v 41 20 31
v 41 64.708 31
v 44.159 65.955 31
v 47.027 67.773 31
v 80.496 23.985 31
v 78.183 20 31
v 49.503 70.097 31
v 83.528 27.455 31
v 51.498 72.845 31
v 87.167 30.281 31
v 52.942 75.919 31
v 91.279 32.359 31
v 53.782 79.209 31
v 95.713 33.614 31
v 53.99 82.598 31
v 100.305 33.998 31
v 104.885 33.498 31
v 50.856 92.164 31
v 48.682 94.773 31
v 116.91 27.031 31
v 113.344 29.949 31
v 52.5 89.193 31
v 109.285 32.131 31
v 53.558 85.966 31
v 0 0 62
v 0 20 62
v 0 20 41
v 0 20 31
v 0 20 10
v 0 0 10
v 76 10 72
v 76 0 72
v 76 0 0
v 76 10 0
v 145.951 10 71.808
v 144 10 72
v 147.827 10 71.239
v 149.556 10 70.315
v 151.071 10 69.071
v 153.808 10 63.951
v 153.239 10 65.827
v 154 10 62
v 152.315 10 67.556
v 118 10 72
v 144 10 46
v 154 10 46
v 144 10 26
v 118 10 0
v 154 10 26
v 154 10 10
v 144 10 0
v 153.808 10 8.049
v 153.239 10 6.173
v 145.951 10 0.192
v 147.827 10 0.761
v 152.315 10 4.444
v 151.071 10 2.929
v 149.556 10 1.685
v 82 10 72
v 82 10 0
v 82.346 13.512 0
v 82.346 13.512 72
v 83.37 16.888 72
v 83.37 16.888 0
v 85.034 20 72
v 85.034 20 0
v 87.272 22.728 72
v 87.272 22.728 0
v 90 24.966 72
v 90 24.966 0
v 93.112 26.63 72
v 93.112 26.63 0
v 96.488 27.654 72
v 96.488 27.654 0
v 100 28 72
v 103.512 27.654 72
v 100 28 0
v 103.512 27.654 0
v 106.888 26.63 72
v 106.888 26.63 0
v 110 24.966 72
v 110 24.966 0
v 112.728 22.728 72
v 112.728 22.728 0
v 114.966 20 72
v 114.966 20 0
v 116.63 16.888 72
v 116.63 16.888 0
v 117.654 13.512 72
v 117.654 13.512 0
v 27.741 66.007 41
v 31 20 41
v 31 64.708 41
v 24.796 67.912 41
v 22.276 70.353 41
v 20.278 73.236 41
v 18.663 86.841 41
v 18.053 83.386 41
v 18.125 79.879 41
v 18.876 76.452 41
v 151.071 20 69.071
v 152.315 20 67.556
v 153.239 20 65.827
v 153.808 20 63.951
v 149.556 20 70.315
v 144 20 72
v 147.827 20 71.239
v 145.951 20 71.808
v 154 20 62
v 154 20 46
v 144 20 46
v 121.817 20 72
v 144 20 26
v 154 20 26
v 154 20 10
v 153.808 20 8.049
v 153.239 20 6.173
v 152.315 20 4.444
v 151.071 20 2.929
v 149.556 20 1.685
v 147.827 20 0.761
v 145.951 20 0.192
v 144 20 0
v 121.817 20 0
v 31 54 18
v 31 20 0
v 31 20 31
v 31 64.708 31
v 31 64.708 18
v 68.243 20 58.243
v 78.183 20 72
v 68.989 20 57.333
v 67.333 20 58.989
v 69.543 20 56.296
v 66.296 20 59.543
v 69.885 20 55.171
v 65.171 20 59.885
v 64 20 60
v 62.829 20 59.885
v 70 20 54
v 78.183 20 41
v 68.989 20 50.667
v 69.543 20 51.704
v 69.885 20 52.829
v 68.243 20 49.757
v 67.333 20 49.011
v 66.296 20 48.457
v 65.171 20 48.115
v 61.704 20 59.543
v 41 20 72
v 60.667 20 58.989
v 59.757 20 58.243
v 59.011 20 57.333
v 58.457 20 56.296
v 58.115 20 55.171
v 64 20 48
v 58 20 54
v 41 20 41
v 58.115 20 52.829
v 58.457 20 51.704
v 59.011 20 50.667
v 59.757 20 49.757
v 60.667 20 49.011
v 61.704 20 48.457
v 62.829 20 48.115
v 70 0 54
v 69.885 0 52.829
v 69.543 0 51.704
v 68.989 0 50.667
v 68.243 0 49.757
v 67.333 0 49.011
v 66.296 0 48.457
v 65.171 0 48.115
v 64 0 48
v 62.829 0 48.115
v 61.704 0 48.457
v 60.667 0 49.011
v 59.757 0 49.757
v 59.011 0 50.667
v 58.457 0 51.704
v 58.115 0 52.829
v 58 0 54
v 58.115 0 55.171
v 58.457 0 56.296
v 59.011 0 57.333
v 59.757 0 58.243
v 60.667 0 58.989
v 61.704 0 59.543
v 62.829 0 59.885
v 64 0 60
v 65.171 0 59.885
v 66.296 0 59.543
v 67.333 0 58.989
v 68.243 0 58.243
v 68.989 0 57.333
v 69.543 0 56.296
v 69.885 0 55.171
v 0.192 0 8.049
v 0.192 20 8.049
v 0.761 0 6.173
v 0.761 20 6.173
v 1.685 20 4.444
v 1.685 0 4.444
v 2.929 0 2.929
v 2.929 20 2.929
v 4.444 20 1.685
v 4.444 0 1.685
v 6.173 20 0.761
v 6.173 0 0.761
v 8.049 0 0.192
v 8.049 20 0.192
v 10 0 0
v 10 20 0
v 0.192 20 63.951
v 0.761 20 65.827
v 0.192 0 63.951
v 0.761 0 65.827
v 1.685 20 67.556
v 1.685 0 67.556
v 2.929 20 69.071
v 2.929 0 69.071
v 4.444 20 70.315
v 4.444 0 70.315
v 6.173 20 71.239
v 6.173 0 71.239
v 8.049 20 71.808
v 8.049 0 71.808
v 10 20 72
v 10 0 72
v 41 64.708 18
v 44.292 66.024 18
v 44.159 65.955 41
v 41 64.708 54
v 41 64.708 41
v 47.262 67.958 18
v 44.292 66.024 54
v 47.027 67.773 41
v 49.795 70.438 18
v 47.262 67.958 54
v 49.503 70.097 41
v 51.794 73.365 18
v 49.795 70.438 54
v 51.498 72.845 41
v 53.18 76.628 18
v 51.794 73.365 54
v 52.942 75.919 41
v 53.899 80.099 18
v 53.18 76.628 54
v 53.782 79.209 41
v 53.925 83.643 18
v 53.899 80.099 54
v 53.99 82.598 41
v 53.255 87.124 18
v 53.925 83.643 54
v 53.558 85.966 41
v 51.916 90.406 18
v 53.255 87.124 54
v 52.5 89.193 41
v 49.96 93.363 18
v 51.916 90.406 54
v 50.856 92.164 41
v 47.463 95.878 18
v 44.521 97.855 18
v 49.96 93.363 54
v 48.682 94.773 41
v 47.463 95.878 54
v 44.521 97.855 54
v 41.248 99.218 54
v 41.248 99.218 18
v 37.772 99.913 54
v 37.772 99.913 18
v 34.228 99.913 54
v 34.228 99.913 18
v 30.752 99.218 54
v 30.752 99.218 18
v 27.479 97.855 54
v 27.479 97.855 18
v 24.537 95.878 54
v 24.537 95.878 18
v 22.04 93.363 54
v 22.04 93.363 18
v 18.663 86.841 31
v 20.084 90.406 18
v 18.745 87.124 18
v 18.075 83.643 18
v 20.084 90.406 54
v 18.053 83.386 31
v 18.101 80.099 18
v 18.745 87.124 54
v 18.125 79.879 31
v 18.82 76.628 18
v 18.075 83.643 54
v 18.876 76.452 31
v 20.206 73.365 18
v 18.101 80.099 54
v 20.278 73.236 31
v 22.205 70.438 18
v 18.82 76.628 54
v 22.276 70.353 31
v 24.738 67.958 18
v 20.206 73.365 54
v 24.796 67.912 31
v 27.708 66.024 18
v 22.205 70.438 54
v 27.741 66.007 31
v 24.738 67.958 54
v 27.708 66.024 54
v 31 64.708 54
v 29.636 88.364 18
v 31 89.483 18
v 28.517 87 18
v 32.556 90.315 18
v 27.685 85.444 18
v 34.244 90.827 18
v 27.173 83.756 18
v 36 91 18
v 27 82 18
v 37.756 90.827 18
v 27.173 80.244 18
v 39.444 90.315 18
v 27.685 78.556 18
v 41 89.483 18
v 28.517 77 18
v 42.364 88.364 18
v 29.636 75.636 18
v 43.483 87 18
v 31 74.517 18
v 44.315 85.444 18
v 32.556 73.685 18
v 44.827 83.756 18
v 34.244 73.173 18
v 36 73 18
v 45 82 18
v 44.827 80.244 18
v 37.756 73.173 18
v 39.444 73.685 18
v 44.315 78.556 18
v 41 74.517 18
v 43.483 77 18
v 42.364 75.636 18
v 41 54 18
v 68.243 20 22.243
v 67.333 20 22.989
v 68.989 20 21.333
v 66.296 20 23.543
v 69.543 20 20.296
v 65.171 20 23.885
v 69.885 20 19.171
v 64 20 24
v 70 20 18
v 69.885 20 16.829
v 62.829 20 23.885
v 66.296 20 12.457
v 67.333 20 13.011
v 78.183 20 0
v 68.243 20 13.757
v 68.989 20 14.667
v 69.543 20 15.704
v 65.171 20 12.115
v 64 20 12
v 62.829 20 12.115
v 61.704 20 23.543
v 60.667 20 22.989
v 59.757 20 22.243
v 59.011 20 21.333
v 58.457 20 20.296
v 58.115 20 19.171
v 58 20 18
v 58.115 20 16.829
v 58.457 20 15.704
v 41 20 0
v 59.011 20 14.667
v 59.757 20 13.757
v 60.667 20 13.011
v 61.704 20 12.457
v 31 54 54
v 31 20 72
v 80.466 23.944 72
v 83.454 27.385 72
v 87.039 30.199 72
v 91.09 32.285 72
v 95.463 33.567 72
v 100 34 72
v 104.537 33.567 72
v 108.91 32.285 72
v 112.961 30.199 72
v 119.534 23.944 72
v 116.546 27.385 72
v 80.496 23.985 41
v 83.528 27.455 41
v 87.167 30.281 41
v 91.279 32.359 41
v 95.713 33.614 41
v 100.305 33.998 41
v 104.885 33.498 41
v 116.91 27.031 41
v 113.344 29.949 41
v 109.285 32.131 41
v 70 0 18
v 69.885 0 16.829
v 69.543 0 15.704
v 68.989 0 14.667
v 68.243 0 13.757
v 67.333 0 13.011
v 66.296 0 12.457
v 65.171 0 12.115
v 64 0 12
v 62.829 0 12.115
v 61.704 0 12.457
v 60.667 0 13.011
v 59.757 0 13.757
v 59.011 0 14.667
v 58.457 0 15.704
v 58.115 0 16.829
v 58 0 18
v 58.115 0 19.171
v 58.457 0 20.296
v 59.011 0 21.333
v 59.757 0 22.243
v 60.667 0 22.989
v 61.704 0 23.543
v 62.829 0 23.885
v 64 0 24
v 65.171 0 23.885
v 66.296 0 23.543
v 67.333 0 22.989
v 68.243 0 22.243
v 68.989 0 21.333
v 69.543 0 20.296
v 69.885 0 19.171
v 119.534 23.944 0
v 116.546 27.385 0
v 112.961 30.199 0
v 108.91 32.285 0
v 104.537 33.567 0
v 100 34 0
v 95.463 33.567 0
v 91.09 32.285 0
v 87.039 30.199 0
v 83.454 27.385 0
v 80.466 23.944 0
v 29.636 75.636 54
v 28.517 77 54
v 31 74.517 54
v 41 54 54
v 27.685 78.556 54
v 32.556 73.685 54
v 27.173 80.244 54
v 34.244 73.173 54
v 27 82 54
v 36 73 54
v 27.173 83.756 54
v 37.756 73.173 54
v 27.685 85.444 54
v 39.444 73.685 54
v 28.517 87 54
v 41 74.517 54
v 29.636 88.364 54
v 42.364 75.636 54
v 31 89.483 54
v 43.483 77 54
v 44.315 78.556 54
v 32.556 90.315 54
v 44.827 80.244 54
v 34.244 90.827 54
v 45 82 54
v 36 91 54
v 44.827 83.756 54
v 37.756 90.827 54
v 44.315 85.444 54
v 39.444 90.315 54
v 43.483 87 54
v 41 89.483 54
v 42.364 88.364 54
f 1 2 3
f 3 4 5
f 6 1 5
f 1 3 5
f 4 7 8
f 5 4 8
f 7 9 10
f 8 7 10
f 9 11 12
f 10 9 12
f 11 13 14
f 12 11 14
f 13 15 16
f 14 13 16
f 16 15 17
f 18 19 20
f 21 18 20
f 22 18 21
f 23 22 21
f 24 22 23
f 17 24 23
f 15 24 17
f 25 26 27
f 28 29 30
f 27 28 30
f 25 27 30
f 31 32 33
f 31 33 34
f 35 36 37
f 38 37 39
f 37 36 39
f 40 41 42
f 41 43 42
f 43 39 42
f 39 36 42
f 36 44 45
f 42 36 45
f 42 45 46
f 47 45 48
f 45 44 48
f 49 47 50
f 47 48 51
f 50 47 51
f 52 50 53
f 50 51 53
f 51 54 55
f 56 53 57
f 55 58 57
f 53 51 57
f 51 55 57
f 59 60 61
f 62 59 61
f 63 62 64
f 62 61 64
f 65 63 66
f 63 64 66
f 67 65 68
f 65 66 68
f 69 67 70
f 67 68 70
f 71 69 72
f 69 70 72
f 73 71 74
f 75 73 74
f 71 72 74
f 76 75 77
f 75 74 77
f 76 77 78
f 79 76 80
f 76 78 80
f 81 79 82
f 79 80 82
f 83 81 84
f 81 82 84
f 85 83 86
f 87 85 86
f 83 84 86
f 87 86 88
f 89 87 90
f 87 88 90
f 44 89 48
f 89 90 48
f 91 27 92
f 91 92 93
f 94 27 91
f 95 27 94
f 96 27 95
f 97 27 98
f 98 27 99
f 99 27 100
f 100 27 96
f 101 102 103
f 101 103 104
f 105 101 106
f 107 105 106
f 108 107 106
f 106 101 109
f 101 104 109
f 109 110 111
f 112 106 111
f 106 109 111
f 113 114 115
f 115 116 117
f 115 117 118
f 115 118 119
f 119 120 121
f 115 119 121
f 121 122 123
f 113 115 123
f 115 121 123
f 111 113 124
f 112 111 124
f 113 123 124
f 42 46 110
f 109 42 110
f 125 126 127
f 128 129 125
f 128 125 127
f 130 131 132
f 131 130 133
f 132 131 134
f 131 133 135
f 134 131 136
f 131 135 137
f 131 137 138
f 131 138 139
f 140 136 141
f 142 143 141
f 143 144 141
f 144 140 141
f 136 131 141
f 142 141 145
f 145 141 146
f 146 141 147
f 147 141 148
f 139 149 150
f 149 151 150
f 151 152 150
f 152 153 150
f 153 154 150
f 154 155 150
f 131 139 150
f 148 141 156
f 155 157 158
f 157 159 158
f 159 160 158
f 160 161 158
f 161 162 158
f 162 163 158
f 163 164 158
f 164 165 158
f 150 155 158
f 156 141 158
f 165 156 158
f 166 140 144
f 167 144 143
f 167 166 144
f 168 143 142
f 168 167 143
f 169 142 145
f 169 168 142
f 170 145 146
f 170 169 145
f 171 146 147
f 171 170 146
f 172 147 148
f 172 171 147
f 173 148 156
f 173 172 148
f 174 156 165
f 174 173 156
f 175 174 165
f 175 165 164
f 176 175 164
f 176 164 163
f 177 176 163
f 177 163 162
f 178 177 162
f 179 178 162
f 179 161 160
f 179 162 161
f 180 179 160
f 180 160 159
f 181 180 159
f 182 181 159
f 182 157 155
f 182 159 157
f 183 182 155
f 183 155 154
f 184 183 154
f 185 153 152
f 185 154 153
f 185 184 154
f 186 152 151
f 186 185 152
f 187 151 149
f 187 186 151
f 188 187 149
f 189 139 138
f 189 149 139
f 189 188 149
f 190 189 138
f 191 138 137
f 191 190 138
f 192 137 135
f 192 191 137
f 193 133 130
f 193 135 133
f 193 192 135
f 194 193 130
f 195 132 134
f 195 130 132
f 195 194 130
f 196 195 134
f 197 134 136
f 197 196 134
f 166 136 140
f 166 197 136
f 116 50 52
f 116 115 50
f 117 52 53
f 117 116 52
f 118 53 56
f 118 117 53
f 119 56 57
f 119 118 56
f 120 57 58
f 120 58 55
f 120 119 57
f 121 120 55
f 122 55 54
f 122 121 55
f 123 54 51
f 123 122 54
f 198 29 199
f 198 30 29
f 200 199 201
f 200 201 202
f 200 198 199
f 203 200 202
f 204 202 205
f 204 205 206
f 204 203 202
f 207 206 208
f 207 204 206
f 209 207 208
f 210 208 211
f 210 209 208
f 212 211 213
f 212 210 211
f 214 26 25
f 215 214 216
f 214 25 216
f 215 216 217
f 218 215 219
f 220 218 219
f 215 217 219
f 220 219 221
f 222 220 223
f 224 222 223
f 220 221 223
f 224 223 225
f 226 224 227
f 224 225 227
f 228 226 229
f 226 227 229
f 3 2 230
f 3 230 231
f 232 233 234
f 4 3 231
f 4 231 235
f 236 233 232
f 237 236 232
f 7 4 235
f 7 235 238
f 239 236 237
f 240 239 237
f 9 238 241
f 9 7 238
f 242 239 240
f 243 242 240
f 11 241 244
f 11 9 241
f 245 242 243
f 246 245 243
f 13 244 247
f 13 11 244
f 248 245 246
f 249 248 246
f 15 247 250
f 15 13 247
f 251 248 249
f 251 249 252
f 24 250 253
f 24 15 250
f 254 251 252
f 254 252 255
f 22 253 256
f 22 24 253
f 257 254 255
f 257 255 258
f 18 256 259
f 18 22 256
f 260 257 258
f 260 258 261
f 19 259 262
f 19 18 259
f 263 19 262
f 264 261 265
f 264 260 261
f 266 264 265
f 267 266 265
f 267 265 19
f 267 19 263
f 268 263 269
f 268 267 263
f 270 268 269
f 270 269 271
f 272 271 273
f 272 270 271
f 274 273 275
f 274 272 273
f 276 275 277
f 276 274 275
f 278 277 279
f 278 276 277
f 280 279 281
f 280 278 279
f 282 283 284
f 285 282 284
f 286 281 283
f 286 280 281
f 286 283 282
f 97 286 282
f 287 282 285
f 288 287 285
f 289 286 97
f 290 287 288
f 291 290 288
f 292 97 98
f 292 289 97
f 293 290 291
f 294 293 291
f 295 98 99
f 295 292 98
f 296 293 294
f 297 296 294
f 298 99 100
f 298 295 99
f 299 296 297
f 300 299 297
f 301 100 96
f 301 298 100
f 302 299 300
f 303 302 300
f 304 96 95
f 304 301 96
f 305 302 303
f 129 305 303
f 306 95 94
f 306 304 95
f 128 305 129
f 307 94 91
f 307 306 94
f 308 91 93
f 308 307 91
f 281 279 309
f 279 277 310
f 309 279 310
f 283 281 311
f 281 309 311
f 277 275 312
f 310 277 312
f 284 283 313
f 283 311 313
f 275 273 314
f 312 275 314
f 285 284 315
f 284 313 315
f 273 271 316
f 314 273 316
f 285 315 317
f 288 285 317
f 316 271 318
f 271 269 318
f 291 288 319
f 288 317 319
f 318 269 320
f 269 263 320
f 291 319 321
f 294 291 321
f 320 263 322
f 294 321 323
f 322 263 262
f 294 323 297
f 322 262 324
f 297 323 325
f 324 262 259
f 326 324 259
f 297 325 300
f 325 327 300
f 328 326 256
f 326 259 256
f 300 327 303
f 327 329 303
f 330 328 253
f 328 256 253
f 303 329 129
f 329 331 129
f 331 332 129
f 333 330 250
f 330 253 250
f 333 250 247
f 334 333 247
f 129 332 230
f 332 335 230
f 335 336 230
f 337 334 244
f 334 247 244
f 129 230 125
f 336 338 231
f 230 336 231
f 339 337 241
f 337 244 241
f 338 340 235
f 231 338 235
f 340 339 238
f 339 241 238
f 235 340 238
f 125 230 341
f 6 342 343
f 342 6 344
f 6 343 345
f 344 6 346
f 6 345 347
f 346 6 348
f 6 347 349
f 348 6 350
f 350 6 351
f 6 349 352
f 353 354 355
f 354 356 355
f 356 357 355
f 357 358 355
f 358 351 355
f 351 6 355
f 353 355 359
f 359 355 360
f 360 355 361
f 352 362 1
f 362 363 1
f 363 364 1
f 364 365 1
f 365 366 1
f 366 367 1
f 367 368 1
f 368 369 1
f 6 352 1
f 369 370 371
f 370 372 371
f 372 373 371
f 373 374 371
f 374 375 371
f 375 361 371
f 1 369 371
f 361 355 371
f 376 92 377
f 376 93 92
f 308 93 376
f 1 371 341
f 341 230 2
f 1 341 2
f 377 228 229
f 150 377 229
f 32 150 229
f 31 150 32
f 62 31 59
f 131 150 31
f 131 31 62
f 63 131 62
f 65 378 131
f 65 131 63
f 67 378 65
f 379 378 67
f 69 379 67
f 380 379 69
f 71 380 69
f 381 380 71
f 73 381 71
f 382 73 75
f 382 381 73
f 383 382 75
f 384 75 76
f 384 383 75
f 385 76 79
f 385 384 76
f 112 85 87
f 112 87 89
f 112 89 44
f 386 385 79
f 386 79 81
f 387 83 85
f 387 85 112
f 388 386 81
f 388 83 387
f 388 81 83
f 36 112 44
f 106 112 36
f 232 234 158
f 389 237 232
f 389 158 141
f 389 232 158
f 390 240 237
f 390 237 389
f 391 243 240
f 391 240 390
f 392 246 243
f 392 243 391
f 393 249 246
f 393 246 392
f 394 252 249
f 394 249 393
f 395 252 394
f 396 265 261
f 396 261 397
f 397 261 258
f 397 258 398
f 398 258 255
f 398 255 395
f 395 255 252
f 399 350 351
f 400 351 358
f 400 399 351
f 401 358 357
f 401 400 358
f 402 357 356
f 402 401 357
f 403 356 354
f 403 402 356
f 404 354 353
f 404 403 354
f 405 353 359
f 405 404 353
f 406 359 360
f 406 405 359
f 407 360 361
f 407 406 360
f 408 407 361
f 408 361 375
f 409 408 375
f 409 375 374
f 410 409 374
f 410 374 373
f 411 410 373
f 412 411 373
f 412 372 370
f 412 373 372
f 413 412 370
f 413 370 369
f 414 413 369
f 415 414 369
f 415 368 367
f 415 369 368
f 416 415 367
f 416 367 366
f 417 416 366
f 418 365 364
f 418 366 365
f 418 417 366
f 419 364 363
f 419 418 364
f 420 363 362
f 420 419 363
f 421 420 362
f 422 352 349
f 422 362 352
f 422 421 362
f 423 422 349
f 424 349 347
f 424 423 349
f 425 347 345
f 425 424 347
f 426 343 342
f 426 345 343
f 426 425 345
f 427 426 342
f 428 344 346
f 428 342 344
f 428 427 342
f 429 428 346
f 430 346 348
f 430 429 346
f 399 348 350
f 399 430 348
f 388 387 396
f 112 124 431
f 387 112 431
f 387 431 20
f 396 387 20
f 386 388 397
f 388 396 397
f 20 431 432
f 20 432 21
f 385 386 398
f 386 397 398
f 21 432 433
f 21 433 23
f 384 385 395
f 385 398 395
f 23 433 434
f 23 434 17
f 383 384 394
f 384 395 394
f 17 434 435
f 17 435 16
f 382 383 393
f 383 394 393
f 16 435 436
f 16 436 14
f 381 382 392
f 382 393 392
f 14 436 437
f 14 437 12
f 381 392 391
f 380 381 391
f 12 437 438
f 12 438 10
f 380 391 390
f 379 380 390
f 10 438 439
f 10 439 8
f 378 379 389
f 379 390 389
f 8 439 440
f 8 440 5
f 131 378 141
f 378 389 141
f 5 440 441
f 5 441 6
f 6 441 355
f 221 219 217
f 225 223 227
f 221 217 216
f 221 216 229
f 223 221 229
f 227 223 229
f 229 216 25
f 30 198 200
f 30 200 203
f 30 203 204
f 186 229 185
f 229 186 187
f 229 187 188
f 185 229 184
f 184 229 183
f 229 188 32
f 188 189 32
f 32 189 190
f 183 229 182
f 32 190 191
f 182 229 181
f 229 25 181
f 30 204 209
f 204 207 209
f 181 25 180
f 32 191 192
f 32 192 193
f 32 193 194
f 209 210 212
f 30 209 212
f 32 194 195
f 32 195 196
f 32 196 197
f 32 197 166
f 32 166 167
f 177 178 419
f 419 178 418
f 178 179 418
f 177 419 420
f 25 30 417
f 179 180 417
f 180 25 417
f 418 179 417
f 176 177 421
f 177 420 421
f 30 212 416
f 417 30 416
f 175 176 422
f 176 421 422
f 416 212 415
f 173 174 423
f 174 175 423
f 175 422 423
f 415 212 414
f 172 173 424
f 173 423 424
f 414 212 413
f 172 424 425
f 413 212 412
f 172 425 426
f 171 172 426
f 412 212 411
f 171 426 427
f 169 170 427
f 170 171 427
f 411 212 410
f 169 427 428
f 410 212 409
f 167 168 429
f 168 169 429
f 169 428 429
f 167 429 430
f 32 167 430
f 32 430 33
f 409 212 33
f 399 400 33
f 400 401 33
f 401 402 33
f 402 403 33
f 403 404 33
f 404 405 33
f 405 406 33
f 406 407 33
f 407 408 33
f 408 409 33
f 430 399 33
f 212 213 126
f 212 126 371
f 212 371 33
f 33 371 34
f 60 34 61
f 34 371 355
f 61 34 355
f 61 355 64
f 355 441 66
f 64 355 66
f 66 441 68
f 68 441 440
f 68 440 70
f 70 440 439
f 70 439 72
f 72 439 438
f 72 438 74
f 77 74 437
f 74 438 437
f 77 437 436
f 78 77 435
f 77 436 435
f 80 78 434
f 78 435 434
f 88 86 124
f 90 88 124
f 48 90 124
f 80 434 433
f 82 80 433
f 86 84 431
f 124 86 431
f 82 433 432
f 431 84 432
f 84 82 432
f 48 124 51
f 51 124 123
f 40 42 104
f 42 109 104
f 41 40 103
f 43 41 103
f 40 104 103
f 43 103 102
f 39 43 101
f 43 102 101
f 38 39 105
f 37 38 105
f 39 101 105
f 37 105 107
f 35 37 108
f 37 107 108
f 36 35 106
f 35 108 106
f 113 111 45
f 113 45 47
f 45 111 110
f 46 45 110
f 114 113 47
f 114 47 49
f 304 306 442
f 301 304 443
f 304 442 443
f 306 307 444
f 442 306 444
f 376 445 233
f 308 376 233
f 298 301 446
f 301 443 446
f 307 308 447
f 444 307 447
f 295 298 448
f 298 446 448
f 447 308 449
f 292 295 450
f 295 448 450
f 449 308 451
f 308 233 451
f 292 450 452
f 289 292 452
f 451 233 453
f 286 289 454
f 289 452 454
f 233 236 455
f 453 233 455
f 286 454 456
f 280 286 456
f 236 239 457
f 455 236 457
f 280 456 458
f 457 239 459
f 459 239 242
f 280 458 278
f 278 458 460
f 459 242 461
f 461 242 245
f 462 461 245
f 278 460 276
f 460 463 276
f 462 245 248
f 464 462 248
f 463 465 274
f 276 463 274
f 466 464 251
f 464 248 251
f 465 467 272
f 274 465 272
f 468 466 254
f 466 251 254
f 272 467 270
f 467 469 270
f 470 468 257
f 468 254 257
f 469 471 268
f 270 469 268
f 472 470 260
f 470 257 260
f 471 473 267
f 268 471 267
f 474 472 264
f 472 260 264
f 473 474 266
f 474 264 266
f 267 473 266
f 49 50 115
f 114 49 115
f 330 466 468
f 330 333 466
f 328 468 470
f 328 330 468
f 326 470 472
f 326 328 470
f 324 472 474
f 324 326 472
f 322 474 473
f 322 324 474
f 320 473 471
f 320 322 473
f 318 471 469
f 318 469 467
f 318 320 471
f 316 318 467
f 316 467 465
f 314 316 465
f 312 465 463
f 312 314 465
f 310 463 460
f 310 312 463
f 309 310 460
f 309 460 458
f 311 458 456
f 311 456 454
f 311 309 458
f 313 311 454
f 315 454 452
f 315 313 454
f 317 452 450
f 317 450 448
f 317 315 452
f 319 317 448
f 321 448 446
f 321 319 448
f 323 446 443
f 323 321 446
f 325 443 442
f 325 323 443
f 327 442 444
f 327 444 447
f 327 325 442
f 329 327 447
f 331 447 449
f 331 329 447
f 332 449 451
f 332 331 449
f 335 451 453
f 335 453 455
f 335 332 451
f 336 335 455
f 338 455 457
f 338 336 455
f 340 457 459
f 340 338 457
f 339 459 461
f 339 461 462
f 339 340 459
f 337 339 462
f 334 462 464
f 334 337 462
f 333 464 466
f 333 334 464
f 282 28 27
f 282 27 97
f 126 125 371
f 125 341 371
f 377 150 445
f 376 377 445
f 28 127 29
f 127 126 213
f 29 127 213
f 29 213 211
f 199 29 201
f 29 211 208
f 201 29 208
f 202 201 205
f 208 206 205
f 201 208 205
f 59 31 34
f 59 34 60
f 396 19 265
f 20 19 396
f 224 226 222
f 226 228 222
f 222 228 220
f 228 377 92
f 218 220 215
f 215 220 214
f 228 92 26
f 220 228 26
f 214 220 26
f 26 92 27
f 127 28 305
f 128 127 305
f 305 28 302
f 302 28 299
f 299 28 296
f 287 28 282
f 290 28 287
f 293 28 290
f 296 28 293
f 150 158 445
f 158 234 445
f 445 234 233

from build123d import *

# Parameters (mm, degrees)
BOSS_EXTRUDE1_DEPTH = 72
FILLET1_R           = 10
SKETCH2_W           = 10
SKETCH2_H           = 20
CUT_EXTRUDE1_DEPTH  = 72
SKETCH3_R           = 18
SKETCH3_R_2         = 9
BOSS_EXTRUDE2_DEPTH = 18
BOSS_EXTRUDE4_DEPTH = 5
RIB20_REACH         = 189.115
SKETCH6_WALL_W      = 472.375598612
SKETCH6_WALL_H      = 10
RIB21_REACH         = 189.115
SKETCH7_WALL_W      = 445.62728217
SKETCH7_WALL_H      = 10
SKETCH8_R           = 6
CUT_EXTRUDE2_DEPTH  = 100


with BuildPart() as part:
    # Sketch1 → Boss-Extrude1 (new body)
    with BuildSketch(Plane.XY):
        with BuildLine():
            Line((76, 0), (76, 10))
            Line((76, 10), (82, 10))
            ThreePointArc((82, 10), (100, 28), (118, 10))
            Line((118, 10), (154, 10))
            Line((154, 10), (154, 20))
            Line((154, 20), (121.817424229, 20))
            ThreePointArc((121.817424229, 20), (100, 34), (78.182575771, 20))
            Line((78.182575771, 20), (0, 20))
            Line((0, 20), (0, 0))
            Line((0, 0), (76, 0))
        make_face()
    extrude(amount=BOSS_EXTRUDE1_DEPTH)

    # Fillet1
    fillet1_edges = [part.edges().sort_by_distance(p)[0] for p in [
        (154, 15, 0),
        (0, 10, 0),
        (154, 15, 72),
        (0, 10, 72),
    ]]
    fillet(fillet1_edges, radius=FILLET1_R)

    # Sketch2 → Cut-Extrude1 (cut)
    with BuildSketch(Plane(origin=(0, 20, 0), x_dir=(1, 0, 0), z_dir=(0, 1, 0))):
        with Locations((149, -36)):
            Rectangle(SKETCH2_W, SKETCH2_H)
    extrude(amount=-CUT_EXTRUDE1_DEPTH, mode=Mode.SUBTRACT)



with BuildPart() as body_2:
    # Sketch3 → Boss-Extrude2 (new, symmetric)
    with BuildSketch(Plane.XY.offset(36)):
        with Locations((36, 82)):
            Circle(SKETCH3_R)
        with Locations((36, 82)):
            Circle(SKETCH3_R_2, mode=Mode.SUBTRACT)
    extrude(amount=BOSS_EXTRUDE2_DEPTH, both=True)


with BuildPart() as part_1:
    add(part.part)

    add(body_2.part)  # Boss-Extrude4 merges body 2
    # Sketch4 → Boss-Extrude4 (add, symmetric)
    with BuildSketch(Plane(origin=(36, 0, 0), x_dir=(0, 0, -1), z_dir=(1, 0, 0))):
        Polygon((-54, 54), (-54, 70.710811109), (-18, 70.710811109), (-18, 54), (0, 20), (-72, 20), align=None)
    extrude(amount=BOSS_EXTRUDE4_DEPTH, both=True)

    # Sketch6 wall → Rib20 (add, up to next)
    with BuildSketch(Plane(origin=(82.796156549, 60.902139154, 36), x_dir=(0.709625674032, -0.704578883273, 0), z_dir=(0.704578883273, 0.709625674032, 0)), mode=Mode.PRIVATE) as rib20_sk1:
        Rectangle(SKETCH6_WALL_W, SKETCH6_WALL_H)
    rib20_tool1 = extrude(rib20_sk1.sketch, amount=-RIB20_REACH, mode=Mode.PRIVATE) - part_1.part
    add(rib20_tool1.solids().sort_by_distance((82.796156549, 60.902139154, 36))[0])

    # Sketch7 wall → Rib21 (add, up to next)
    with BuildSketch(Plane(origin=(9.33156562, 53.420381253, 36), x_dir=(0.268931250293, 0.963159375501, 0), z_dir=(-0.963159375501, 0.268931250293, 0)), mode=Mode.PRIVATE) as rib21_sk1:
        Rectangle(SKETCH7_WALL_W, SKETCH7_WALL_H)
    rib21_tool1 = extrude(rib21_sk1.sketch, amount=-RIB21_REACH, mode=Mode.PRIVATE) - part_1.part
    add(rib21_tool1.solids().sort_by_distance((9.33156562, 53.420381253, 36))[0])

    # Sketch8 → Cut-Extrude2 (cut)
    with BuildSketch(Plane(origin=(0, 0, 0), x_dir=(1, 0, 0), z_dir=(0, 1, 0))):
        with Locations((64, -18)):
            Circle(SKETCH8_R)
        with Locations((64, -54)):
            Circle(SKETCH8_R)
    extrude(amount=CUT_EXTRUDE2_DEPTH, mode=Mode.SUBTRACT)


solid = part_1.part
